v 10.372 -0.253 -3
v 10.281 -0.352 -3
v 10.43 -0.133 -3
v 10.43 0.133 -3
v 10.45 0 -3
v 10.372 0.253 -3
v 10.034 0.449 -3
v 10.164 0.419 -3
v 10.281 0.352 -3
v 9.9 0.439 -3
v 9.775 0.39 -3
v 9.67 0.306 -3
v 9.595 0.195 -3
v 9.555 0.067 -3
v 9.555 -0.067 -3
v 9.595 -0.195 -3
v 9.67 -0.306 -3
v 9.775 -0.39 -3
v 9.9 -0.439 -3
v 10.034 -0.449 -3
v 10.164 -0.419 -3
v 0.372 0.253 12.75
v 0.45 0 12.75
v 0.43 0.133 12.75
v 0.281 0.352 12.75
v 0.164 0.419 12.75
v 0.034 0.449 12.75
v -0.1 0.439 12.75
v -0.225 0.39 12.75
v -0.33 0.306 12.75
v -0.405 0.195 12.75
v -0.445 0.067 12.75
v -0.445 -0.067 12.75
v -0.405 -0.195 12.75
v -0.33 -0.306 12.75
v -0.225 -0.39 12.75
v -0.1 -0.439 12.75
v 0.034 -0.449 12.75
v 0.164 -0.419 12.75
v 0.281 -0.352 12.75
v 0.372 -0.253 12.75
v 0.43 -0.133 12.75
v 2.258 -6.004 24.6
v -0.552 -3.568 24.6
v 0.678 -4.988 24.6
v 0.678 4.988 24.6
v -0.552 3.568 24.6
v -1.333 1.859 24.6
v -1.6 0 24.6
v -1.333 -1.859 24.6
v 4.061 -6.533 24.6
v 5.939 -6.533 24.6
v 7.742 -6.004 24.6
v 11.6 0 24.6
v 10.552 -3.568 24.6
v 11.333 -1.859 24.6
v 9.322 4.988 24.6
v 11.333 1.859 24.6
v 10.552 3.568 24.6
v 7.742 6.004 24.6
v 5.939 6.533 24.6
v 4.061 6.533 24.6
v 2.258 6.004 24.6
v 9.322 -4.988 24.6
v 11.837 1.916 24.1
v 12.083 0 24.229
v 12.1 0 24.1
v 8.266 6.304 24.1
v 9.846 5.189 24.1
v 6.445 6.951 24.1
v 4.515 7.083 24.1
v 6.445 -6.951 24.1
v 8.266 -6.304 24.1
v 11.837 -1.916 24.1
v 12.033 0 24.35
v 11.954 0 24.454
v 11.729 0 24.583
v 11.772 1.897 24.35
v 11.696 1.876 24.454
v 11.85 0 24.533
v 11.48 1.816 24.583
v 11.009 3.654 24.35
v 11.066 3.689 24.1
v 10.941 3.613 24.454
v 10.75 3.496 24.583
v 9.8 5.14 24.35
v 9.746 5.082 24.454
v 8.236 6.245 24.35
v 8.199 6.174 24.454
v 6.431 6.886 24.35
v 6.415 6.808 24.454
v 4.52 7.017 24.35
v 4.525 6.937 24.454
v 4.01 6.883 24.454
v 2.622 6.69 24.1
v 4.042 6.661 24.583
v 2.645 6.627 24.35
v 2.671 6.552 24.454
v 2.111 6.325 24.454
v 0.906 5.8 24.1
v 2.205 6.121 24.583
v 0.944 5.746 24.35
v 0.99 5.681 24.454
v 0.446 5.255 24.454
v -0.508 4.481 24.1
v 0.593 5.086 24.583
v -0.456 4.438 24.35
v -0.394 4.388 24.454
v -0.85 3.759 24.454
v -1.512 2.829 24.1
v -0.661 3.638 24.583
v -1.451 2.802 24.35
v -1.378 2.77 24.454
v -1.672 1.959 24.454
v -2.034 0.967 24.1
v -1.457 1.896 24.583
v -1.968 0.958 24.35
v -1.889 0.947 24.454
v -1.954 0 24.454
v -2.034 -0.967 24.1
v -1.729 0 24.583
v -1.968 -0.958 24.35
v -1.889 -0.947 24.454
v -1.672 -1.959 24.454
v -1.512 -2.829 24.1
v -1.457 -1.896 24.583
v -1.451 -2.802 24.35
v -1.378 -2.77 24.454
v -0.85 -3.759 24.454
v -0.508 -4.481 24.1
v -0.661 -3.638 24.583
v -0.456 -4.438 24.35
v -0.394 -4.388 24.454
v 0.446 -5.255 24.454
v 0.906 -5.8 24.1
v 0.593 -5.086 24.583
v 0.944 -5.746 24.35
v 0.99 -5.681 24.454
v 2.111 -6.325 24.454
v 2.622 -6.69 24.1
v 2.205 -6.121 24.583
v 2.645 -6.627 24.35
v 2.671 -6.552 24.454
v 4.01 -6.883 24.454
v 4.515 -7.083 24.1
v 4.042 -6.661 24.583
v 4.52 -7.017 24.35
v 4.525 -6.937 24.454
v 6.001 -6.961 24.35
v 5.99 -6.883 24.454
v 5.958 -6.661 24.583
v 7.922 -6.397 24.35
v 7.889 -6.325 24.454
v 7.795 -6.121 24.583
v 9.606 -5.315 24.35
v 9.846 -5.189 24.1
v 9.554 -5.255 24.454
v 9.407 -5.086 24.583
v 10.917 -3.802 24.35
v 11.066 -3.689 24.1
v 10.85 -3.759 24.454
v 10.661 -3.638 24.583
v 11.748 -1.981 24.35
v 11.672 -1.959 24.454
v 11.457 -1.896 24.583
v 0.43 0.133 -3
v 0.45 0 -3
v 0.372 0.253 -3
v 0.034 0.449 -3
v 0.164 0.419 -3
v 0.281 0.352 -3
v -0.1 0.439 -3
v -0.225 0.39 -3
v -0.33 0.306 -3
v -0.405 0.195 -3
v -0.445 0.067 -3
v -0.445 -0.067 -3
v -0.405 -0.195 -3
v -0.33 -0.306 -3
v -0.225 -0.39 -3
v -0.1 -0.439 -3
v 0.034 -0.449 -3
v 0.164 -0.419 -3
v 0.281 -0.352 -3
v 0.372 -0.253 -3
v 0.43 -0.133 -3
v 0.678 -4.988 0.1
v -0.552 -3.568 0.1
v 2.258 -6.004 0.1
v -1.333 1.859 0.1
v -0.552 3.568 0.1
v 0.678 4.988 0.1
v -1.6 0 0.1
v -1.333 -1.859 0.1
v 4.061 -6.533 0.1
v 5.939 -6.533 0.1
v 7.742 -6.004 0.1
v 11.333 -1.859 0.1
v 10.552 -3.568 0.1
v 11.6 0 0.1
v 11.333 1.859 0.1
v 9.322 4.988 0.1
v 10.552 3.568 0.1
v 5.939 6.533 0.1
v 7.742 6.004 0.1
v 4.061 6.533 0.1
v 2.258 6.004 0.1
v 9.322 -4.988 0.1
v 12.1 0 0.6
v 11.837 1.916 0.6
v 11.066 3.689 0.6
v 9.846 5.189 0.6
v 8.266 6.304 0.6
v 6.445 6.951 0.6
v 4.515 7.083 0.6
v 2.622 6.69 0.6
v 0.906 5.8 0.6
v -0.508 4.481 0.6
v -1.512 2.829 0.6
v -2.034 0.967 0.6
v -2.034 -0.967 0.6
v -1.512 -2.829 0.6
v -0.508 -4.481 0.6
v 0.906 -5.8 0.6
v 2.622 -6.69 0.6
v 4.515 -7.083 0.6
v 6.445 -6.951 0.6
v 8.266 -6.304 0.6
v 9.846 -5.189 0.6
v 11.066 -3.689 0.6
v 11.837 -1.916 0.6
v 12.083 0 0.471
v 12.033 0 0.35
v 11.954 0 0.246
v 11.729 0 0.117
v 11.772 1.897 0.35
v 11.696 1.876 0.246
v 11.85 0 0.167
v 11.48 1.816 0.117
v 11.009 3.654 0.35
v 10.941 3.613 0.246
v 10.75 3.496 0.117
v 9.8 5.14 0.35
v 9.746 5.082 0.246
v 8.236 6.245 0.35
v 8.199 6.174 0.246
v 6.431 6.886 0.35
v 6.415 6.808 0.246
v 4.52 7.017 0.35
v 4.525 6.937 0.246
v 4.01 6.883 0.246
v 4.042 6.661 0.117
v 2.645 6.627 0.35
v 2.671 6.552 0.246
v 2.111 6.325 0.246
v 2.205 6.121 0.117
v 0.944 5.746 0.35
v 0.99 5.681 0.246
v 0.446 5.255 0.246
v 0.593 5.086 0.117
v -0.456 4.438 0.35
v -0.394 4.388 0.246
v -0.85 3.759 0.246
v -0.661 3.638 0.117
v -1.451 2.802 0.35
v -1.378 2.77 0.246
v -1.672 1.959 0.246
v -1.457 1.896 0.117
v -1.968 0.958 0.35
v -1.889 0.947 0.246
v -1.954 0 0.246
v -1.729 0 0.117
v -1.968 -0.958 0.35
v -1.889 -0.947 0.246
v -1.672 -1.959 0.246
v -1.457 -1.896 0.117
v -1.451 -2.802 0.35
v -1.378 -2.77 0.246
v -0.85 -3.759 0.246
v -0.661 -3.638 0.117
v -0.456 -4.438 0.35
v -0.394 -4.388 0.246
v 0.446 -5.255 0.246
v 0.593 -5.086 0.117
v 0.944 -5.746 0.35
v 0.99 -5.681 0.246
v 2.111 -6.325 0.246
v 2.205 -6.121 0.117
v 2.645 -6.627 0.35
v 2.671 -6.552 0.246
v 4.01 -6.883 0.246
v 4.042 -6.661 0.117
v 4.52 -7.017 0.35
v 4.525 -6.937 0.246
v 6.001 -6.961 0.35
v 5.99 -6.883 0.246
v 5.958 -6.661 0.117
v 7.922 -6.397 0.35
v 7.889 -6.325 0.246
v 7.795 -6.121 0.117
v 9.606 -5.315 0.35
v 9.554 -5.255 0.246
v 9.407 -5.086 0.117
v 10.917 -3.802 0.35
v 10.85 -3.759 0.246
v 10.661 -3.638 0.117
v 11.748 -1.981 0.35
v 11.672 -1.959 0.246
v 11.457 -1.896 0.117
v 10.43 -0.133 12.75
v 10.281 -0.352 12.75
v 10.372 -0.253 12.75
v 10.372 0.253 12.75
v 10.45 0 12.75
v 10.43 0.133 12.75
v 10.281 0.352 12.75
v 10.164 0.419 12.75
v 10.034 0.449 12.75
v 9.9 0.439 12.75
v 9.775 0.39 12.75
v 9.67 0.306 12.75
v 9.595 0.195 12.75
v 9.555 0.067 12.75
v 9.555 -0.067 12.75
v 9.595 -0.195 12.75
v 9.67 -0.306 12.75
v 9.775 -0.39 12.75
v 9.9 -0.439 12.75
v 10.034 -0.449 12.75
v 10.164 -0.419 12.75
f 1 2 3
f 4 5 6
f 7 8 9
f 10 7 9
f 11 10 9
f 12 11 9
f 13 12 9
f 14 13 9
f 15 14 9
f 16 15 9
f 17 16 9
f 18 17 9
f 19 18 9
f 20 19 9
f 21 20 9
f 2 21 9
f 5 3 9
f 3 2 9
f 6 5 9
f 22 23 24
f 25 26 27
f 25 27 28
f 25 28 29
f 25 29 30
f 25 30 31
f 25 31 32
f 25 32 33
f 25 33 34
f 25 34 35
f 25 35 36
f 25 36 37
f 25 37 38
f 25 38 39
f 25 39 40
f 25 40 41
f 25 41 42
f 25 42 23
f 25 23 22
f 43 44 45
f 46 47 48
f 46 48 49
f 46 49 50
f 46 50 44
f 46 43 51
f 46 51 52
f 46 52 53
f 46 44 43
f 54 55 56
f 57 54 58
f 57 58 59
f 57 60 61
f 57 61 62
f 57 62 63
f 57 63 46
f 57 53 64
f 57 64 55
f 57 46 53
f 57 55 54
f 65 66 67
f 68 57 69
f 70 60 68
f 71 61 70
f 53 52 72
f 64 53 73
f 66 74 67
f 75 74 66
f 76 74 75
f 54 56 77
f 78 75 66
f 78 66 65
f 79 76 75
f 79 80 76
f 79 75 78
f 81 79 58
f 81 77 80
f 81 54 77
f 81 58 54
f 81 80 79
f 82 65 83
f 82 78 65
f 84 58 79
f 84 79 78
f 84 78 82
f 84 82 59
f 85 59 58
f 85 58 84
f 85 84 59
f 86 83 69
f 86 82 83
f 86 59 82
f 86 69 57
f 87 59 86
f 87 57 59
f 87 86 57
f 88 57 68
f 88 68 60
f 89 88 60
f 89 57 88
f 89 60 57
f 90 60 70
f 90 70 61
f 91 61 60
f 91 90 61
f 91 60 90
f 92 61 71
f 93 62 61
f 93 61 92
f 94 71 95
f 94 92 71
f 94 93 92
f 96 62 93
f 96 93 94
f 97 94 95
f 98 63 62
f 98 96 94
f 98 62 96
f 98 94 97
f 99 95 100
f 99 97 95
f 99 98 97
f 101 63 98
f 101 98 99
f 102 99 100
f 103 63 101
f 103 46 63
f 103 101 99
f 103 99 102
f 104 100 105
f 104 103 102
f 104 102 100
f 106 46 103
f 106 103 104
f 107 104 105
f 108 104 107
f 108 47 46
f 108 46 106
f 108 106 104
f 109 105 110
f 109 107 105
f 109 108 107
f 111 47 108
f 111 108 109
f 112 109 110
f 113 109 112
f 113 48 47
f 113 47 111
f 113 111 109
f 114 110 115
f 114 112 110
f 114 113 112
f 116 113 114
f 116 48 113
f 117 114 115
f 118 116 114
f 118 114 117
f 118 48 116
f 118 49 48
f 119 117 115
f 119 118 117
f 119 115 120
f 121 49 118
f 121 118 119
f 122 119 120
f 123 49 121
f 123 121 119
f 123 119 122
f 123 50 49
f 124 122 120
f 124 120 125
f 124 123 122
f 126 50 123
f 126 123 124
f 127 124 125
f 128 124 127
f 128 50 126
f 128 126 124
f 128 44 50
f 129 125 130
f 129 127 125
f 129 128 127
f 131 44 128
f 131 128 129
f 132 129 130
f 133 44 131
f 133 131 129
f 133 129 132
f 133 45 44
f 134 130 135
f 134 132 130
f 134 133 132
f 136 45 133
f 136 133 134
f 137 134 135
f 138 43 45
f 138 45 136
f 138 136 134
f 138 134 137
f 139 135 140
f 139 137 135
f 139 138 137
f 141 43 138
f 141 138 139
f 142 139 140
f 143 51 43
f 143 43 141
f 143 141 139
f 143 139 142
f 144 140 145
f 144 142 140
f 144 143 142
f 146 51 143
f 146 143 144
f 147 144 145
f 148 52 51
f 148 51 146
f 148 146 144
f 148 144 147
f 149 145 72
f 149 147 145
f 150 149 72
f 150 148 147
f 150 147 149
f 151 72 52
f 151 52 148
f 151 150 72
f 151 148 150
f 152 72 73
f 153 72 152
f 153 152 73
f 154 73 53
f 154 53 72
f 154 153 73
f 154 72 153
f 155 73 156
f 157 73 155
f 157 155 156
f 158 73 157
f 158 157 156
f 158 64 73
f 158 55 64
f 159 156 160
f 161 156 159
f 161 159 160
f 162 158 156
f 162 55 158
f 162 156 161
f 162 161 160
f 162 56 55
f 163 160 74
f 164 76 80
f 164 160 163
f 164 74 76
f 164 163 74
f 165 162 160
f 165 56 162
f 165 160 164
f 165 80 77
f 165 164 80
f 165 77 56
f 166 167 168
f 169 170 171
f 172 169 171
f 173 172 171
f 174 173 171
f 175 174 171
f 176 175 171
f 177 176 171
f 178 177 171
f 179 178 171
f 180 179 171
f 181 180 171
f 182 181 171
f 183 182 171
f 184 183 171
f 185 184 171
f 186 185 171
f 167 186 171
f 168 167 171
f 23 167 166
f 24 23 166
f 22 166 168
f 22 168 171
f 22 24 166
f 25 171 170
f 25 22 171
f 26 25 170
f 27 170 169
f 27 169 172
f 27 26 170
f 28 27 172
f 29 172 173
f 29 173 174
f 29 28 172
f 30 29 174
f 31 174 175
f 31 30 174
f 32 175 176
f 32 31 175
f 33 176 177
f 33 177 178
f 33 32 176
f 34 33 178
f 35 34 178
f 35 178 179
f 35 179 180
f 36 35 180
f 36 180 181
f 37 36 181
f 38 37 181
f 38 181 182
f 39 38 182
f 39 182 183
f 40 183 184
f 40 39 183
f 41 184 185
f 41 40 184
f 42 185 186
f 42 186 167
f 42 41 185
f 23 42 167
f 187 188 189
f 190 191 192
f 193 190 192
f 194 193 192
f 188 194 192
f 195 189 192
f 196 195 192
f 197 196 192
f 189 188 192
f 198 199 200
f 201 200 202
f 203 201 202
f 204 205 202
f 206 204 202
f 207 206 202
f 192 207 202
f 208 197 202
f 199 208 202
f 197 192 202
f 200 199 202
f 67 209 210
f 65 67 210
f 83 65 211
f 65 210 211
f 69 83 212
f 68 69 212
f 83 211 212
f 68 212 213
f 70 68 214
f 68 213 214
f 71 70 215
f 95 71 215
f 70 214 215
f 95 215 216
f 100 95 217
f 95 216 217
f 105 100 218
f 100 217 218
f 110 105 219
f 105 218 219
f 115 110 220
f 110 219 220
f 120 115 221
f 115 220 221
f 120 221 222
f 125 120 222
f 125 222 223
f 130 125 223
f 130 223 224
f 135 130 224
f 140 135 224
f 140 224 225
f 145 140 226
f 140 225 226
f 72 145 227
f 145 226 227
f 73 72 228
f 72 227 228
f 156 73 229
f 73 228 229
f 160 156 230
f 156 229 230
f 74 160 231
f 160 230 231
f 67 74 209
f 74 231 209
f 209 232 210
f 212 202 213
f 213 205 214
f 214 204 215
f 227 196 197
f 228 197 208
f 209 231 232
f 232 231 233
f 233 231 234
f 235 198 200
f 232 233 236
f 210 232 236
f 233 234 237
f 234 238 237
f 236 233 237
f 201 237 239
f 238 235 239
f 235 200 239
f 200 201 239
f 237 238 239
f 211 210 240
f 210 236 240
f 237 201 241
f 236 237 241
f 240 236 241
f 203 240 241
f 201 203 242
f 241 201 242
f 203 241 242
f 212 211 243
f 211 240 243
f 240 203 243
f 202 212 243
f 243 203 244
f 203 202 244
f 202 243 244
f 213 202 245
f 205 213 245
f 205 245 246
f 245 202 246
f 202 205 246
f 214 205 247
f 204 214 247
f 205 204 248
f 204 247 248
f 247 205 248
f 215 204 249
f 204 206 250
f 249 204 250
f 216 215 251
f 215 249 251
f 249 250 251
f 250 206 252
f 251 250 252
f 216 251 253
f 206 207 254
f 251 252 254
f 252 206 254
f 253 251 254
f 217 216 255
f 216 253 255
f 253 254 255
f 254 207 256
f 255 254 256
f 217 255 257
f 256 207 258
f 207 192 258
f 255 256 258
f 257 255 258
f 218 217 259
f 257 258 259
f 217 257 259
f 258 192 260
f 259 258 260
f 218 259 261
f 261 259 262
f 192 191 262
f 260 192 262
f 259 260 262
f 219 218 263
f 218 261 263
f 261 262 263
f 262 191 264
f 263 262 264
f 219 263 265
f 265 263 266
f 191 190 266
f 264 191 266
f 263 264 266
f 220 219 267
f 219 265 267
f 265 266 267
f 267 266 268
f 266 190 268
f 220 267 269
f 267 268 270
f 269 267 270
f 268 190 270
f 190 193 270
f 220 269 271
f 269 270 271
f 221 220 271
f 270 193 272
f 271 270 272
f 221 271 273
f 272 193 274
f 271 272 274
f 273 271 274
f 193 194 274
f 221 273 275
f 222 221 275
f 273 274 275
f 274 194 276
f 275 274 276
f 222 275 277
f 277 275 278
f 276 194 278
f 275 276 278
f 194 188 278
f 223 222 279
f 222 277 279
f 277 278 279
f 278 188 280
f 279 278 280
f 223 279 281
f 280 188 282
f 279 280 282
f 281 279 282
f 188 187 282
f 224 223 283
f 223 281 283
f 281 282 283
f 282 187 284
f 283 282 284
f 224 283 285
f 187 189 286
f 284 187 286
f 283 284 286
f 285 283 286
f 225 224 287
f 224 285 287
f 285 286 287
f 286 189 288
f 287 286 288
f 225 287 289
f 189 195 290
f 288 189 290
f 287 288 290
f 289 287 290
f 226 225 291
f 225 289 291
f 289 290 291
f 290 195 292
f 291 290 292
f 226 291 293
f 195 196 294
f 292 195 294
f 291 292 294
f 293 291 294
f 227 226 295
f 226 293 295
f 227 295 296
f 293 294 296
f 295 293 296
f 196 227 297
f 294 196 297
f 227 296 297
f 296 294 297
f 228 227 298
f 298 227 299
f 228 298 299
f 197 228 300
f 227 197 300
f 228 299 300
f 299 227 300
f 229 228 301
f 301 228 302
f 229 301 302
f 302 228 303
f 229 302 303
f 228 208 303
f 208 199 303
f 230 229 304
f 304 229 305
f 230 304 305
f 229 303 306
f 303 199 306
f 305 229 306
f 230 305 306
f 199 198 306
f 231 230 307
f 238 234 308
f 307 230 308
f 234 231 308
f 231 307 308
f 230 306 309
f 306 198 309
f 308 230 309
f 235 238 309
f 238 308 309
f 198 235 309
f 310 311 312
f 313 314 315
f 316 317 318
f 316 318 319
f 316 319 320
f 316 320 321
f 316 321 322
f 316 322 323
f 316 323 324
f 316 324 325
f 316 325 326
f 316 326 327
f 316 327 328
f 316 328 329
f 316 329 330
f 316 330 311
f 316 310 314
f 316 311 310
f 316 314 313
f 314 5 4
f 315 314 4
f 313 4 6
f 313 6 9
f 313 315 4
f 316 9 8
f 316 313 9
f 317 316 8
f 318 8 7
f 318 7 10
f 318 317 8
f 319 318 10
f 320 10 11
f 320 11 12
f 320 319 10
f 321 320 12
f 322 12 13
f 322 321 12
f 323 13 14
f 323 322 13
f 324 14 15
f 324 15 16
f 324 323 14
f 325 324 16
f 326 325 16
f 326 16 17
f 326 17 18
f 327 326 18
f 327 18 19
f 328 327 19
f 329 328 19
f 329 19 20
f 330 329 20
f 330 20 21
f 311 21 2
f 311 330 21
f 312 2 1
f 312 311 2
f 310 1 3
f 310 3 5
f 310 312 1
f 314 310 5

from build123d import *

# Parameters (mm, degrees)
SKETCH001_R       = 0.45
PAD001_DEPTH      = 12.25
PAD001_DEPTH_BACK = 3.5
SKETCH_R          = 7.1
PAD_DEPTH         = 24.5
FILLET_R          = 0.5


with BuildPart() as pad001:
    # Sketch001 → Pad001 (new body, two sides)
    with BuildSketch(Plane.XY.offset(0.5)) as pad001_sk:
        Circle(SKETCH001_R)
        with Locations((10, 0)):
            Circle(SKETCH001_R)
    extrude(amount=PAD001_DEPTH)
    extrude(pad001_sk.sketch, amount=-PAD001_DEPTH_BACK)


with BuildPart() as fillet_body:
    # Sketch → Pad (new body)
    with BuildSketch(Plane.XY.offset(0.1)):
        with Locations((5, 0)):
            Circle(SKETCH_R)
    extrude(amount=PAD_DEPTH)

    # Fillet
    fillet_edges = [fillet_body.edges().sort_by_distance(p)[0] for p in [
        (-2.1, 0, 0.1),
        (-2.1, 0, 24.6),
    ]]
    fillet(fillet_edges, radius=FILLET_R)


solid = Compound([pad001.part, fillet_body.part])
